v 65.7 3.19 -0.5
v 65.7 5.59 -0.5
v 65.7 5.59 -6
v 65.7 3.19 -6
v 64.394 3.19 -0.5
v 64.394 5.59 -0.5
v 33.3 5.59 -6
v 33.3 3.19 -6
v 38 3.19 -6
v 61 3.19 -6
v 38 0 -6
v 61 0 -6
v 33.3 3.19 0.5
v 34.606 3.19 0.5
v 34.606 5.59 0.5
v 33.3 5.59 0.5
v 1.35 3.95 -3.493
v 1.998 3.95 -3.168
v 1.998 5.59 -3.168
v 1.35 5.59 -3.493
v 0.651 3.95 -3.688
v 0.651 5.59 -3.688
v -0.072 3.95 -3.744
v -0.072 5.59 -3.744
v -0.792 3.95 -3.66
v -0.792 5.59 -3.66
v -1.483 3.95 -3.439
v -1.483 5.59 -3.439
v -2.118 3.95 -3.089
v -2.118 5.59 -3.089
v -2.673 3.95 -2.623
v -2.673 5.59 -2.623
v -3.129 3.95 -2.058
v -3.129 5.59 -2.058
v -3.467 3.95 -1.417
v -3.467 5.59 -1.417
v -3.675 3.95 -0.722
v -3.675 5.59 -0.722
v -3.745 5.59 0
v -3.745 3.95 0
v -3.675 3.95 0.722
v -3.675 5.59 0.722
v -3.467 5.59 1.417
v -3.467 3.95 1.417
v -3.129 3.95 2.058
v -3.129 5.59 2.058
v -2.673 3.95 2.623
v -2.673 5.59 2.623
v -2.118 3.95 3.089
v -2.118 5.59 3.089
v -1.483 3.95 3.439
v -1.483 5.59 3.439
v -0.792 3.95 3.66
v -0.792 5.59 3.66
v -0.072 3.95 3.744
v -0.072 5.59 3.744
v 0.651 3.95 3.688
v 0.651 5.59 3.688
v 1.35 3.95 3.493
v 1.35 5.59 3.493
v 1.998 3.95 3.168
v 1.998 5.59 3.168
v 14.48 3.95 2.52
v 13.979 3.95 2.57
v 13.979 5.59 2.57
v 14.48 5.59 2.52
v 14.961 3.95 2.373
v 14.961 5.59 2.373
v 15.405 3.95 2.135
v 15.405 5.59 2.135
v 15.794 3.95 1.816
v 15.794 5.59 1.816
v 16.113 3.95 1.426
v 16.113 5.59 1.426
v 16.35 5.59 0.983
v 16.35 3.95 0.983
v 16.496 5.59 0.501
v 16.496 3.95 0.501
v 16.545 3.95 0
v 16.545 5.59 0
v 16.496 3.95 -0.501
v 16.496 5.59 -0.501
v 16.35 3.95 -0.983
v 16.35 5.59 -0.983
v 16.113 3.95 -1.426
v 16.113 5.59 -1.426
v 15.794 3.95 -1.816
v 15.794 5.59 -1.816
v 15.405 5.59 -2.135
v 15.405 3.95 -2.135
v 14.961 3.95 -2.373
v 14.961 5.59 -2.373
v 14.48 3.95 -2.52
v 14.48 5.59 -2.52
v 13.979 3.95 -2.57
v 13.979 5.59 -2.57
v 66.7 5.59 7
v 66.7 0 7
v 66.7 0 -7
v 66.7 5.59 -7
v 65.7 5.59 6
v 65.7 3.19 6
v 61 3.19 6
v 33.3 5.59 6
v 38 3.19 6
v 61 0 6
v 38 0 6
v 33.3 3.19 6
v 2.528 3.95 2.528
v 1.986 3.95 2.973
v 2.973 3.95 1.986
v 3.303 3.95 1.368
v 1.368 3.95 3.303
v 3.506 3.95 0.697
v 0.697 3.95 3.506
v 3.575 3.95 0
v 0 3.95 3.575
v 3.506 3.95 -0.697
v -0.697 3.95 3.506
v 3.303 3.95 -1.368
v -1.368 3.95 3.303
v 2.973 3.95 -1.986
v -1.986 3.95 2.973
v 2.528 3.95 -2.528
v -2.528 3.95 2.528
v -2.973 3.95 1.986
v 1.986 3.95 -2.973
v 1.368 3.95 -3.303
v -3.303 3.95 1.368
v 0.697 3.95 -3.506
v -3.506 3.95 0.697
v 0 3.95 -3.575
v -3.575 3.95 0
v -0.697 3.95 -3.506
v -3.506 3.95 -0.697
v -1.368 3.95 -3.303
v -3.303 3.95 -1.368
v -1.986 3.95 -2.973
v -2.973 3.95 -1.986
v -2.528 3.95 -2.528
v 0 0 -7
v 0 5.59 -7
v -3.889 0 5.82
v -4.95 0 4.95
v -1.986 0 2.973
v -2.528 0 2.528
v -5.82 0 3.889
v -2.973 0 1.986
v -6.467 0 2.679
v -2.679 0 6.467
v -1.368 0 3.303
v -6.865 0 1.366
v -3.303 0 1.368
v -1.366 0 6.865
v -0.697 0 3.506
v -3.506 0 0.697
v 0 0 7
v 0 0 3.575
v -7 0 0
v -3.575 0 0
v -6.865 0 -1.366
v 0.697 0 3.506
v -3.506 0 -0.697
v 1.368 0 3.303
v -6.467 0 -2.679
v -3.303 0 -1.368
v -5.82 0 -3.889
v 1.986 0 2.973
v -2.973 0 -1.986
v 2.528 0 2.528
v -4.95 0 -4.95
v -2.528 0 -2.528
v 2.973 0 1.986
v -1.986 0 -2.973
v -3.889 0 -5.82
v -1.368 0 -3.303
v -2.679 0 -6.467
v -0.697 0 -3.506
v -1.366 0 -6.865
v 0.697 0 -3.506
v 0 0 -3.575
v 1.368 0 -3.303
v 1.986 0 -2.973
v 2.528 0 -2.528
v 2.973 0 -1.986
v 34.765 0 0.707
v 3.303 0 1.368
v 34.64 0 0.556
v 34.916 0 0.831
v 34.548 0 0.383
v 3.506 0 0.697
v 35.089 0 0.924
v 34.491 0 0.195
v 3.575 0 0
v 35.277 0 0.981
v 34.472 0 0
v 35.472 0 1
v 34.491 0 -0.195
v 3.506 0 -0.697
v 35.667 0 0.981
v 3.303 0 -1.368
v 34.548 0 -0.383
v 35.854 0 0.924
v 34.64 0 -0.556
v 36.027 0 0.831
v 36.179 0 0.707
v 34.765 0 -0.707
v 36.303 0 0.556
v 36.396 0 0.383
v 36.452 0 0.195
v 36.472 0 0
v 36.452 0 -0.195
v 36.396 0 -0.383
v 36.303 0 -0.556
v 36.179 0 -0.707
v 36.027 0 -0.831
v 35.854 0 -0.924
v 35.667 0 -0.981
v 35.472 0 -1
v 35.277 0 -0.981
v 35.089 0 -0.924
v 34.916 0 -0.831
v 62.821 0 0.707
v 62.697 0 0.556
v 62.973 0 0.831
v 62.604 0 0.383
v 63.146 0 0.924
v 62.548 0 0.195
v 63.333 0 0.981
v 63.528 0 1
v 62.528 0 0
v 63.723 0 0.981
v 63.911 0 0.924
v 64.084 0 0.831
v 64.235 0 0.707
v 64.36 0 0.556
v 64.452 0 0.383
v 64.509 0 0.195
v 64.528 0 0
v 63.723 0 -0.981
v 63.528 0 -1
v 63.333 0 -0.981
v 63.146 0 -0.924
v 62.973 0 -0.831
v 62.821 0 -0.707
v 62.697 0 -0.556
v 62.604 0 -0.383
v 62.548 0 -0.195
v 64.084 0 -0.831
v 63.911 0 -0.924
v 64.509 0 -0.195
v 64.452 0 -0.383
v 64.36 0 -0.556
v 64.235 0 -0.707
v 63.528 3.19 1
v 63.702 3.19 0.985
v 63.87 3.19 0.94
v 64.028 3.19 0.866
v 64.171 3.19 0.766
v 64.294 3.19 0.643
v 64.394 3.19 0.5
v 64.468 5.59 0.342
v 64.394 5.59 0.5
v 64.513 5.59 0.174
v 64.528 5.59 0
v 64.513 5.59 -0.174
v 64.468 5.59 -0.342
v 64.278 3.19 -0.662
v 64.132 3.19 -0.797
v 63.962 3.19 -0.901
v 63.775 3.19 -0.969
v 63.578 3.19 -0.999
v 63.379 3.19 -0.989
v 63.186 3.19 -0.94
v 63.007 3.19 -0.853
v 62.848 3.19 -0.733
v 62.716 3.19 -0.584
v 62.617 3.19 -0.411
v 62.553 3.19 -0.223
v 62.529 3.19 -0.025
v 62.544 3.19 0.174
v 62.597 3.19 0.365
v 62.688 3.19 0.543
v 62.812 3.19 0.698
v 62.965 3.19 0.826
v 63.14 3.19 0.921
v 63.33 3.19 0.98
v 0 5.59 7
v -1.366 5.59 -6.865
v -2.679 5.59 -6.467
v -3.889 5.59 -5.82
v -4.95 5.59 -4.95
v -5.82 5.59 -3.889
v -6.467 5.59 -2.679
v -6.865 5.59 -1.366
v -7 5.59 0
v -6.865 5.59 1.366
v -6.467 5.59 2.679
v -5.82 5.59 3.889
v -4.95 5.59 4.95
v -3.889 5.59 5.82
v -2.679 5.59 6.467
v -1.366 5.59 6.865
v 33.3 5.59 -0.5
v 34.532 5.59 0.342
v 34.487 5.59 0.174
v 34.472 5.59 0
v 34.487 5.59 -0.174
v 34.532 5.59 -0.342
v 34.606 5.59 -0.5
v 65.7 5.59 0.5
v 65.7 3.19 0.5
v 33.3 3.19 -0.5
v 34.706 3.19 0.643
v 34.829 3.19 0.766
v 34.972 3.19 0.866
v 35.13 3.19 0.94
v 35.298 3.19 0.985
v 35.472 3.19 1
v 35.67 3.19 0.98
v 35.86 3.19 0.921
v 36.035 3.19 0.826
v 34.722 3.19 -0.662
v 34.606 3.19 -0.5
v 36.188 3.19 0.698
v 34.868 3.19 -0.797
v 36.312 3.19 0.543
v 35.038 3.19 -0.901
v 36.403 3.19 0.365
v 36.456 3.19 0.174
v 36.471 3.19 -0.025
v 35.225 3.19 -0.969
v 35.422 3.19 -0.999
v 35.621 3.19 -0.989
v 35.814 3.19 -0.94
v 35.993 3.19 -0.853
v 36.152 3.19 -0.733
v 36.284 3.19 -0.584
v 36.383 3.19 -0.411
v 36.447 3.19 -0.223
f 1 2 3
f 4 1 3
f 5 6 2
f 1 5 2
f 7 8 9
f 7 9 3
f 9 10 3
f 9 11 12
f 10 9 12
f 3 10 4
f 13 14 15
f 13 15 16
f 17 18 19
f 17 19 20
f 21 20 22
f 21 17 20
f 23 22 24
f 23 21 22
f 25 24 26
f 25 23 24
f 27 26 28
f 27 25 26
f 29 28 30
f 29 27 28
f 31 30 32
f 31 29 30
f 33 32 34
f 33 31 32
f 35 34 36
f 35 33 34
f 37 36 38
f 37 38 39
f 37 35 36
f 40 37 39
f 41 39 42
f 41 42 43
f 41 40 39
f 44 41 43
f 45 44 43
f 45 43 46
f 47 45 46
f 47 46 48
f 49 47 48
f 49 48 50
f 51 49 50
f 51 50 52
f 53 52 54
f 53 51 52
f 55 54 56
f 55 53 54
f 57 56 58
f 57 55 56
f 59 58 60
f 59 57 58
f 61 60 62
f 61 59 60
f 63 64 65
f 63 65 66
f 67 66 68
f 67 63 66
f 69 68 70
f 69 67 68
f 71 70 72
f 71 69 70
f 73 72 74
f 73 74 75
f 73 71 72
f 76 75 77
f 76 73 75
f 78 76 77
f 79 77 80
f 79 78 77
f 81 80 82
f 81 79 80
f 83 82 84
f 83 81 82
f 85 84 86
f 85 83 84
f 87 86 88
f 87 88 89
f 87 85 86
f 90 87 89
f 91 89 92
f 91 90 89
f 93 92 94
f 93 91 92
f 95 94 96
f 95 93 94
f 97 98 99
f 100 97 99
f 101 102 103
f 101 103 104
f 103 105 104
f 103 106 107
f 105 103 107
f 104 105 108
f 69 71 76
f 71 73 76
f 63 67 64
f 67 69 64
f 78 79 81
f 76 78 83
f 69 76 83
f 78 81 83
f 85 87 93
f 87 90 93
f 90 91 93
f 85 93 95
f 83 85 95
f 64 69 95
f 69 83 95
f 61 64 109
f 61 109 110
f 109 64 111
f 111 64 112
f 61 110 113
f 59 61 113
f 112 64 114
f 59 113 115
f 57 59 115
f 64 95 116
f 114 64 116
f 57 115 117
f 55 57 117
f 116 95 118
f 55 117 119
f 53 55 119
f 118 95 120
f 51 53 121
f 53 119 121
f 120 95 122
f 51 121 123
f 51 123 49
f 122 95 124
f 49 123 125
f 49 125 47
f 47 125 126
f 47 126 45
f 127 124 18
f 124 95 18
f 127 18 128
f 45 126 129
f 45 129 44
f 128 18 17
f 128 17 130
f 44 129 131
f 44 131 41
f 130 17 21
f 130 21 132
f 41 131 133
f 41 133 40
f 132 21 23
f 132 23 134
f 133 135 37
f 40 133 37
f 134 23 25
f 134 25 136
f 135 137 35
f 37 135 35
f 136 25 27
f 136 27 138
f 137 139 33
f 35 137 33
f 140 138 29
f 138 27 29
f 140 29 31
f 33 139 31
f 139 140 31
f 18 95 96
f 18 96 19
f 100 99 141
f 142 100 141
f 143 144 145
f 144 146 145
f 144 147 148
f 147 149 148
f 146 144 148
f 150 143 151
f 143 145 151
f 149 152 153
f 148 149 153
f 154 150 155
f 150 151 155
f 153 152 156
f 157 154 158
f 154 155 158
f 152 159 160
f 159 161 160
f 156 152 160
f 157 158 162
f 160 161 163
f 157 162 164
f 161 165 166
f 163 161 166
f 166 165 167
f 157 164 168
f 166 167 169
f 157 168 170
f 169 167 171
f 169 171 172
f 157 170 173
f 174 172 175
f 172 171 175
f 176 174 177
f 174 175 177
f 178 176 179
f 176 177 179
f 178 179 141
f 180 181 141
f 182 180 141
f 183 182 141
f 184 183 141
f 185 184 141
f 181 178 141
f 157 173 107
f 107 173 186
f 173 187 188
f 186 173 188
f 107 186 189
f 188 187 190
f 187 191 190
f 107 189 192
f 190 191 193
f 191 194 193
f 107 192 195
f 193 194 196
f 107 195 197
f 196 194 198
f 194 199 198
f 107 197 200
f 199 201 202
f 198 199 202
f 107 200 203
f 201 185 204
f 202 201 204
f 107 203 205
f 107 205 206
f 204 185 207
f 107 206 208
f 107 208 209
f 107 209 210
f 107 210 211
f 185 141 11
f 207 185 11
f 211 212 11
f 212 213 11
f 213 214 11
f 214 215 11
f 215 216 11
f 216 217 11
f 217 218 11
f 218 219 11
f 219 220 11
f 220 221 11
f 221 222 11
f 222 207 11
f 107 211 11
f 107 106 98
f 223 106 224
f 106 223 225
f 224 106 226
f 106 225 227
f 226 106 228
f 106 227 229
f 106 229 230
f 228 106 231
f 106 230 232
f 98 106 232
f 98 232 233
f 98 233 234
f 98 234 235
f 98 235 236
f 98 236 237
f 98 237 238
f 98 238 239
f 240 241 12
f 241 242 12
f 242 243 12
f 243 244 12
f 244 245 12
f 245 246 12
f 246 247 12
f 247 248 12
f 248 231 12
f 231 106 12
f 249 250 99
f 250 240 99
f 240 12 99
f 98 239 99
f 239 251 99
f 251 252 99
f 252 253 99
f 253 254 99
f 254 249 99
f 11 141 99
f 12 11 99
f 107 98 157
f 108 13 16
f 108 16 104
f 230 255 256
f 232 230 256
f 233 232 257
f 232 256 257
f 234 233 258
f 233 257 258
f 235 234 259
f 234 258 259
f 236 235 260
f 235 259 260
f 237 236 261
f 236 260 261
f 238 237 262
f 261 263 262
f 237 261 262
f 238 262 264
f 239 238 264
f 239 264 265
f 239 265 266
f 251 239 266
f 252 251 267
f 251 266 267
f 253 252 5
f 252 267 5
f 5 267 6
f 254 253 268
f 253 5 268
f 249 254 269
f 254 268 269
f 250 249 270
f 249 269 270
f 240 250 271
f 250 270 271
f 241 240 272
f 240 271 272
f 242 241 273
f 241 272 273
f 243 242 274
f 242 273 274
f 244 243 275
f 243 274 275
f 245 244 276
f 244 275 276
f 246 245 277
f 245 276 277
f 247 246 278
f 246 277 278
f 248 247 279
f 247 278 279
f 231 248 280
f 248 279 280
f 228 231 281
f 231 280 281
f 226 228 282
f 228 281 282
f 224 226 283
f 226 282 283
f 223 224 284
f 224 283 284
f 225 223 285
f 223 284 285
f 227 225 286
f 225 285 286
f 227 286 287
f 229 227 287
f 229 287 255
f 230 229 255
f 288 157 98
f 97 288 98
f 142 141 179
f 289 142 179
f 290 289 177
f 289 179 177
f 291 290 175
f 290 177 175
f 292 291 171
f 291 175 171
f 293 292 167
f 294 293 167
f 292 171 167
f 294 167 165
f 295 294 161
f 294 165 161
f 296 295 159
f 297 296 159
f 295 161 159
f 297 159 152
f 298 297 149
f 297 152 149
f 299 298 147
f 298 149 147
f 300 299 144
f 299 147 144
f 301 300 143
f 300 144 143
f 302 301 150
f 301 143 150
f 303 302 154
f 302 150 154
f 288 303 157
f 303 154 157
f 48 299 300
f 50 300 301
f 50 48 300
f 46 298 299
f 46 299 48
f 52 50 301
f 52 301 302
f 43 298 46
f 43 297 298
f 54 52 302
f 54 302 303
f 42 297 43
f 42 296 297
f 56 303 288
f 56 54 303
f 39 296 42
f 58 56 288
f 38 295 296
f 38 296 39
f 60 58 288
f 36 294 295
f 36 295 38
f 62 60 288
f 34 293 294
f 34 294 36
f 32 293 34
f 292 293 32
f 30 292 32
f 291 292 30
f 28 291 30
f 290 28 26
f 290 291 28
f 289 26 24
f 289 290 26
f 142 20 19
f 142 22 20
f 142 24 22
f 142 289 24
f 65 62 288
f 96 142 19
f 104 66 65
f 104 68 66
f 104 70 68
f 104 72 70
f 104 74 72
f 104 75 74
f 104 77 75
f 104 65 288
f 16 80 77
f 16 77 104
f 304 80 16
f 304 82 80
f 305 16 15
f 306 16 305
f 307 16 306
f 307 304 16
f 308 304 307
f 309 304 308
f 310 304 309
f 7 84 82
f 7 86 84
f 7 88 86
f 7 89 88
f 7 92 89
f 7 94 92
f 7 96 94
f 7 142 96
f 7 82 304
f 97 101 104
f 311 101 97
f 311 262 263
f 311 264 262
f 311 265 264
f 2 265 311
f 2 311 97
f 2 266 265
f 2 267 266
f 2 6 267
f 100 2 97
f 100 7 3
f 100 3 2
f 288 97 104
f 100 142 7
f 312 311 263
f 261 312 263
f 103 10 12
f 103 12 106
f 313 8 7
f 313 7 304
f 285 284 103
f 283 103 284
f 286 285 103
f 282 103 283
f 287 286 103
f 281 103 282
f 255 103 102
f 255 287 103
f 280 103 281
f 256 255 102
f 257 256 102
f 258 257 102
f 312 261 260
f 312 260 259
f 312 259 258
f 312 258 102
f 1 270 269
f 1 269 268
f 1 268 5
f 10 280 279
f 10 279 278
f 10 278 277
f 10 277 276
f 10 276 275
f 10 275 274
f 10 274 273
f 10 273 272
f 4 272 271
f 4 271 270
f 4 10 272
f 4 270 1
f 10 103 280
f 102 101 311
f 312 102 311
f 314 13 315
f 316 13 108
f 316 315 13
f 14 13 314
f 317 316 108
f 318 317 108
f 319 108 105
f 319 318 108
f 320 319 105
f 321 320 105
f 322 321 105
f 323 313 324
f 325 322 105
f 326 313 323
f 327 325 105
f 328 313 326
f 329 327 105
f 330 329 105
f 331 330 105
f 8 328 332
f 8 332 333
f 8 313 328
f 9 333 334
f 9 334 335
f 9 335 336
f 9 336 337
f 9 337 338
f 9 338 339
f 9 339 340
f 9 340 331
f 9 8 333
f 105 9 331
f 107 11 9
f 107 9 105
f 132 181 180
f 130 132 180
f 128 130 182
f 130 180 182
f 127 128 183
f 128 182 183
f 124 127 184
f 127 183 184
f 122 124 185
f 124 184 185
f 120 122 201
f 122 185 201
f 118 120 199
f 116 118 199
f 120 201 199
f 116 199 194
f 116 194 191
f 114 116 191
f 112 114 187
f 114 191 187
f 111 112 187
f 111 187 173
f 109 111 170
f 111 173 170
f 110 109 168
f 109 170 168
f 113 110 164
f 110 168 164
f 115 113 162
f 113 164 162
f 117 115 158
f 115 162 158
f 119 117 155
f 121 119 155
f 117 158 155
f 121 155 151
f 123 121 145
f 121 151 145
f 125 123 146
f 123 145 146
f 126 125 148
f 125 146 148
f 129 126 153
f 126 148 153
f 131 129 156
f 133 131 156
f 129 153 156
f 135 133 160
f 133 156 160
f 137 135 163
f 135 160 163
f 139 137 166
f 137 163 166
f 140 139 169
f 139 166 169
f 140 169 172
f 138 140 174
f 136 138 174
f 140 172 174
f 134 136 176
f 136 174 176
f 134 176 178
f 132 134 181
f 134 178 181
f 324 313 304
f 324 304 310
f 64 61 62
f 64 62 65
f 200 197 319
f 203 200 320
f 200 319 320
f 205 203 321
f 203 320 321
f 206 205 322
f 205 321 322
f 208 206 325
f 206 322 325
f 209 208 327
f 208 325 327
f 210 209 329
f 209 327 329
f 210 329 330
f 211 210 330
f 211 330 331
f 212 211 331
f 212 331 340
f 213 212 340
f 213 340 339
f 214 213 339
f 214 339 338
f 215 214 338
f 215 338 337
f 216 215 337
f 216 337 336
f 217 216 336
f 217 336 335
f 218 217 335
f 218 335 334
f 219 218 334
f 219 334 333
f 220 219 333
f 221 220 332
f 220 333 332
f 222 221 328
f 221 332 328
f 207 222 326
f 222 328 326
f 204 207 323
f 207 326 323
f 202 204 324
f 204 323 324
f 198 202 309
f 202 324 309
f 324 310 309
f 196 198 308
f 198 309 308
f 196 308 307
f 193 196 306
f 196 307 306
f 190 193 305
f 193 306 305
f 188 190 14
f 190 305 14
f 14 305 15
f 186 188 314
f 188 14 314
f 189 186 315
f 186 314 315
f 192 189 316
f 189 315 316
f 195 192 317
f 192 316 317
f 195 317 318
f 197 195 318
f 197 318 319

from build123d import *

# Parameters (mm, degrees)
BOSS_EXTRUDE1_DEPTH = 3.95
SKETCH2_R           = 3.575
CUT_EXTRUDE1_DEPTH  = 3.95
BOSS_EXTRUDE2_DEPTH = 1.64
SKETCH4_R           = 3.25
CUT_EXTRUDE2_DEPTH  = 63.643819328
CAVITY1_OUTLINE_R   = 3.25
CAVITY1_DEPTH       = 5.59
CAVITY1_START       = 3.19
CAVITY1_2_DEPTH     = 2.4
CUT_EXTRUDE4_DEPTH  = 63.643819328
BOSS_EXTRUDE3_START = -5.59
BOSS_EXTRUDE3_DEPTH = 5.59
BOSS_EXTRUDE4_DEPTH = 5.59
BOSS_EXTRUDE5_DEPTH = 5.59
CUT_EXTRUDE5_DEPTH  = 2.4
SKETCH7_R           = 1
CUT_EXTRUDE6_DEPTH  = 5.59


# Read off the part's stored shape, not the designer's step: Cavity1
with BuildPart() as part:
    # Sketch1 → Boss-Extrude1 (new body)
    with BuildSketch(Plane(origin=(0, 0, 0), x_dir=(1, 0, 0), z_dir=(0, 1, 0))):
        with BuildLine():
            Line((0, 7), (55, 7))
            ThreePointArc((55, 7), (62, 0), (55, -7))
            Line((55, -7), (0, -7))
            ThreePointArc((0, -7), (-7, 0), (0, 7))
        make_face()
    extrude(amount=BOSS_EXTRUDE1_DEPTH)

    # Sketch2 → Cut-Extrude1 (cut)
    with BuildSketch(Plane.XZ):
        with Locations(Location((0, 0, 0), (0, 0, 270))):
            Circle(SKETCH2_R)
    extrude(amount=-CUT_EXTRUDE1_DEPTH, mode=Mode.SUBTRACT)

    # Sketch3 → Boss-Extrude2 (add)
    with BuildSketch(Plane(origin=(0, 3.95, 0), x_dir=(1, 0, 0), z_dir=(0, 1, 0))):
        with BuildLine():
            Line((0, -7), (55, -7))
            ThreePointArc((55, -7), (62, 0), (55, 7))
            Line((55, 7), (0, 7))
            ThreePointArc((0, 7), (-7, 0), (0, -7))
        make_face()
        with BuildLine():
            Line((13.979308982, 2.569996388), (1.997926282, 3.167540934))
            ThreePointArc((1.997926282, 3.167540934), (-3.745, 0), (1.997926282, -3.167540934))
            Line((1.997926282, -3.167540934), (13.979308982, -2.569996388))
            ThreePointArc((13.979308982, -2.569996388), (16.545, 0), (13.979308982, 2.569996388))
        make_face(mode=Mode.SUBTRACT)
    extrude(amount=BOSS_EXTRUDE2_DEPTH)

    # Sketch4 → Cut-Extrude2 (cut, through all)
    with BuildSketch(Plane(origin=(0, 5.59, 0), x_dir=(1, 0, 0), z_dir=(0, 1, 0))):
        with Locations(Location((55, 0, 0), (0, 0, 270))):
            Circle(SKETCH4_R)
    extrude(amount=-CUT_EXTRUDE2_DEPTH, mode=Mode.SUBTRACT)

    # Cavity1 outline → Cavity1 (cut)
    with BuildSketch(Plane(origin=(0, 0, 0), x_dir=(1, 0, 0), z_dir=(0, 1, 0))):
        with BuildLine():
            Line((58.605551275, 6), (38, 6))
            Line((38, 6), (38, -6))
            Line((38, -6), (58.605551275, -6))
            ThreePointArc((58.605551275, -6), (59.949747468, -4.949747468), (61, -3.605551275))
            Line((61, -3.605551275), (61, 3.605551275))
            ThreePointArc((61, 3.605551275), (59.949747468, 4.949747468), (58.605551275, 6))
        make_face()
        with Locations((55, 0)):
            Circle(CAVITY1_OUTLINE_R, mode=Mode.SUBTRACT)
    extrude(amount=CAVITY1_DEPTH, mode=Mode.SUBTRACT)

    # Cavity1 2 outline → Cavity1 2 (cut)
    with BuildSketch(Plane(origin=(0, 0, 0), x_dir=(1, 0, 0), z_dir=(0, 1, 0)).offset(CAVITY1_START)):
        with BuildLine():
            Line((33.3, 0.5), (34.605619966, 0.5))
            ThreePointArc((34.605619966, 0.5), (36.47164537, 0), (34.605619966, -0.5))
            Line((34.605619966, -0.5), (33.3, -0.5))
            Line((33.3, -0.5), (33.3, -6))
            Line((33.3, -6), (38, -6))
            Line((38, -6), (38, 6))
            Line((38, 6), (33.3, 6))
            Line((33.3, 6), (33.3, 0.5))
        make_face()
        with BuildLine():
            ThreePointArc((61, -3.605551275), (62, 0), (61, 3.605551275))
            Line((61, 3.605551275), (61, -3.605551275))
        make_face()
    extrude(amount=CAVITY1_2_DEPTH, mode=Mode.SUBTRACT)

    # Sketch5 → Cut-Extrude4 (cut, through all)
    with BuildSketch(Plane.XZ):
        with BuildLine():
            Line((61, 3.605551275), (61, -3.605551275))
            ThreePointArc((61, -3.605551275), (62, 0), (61, 3.605551275))
        make_face()
    extrude(amount=-CUT_EXTRUDE4_DEPTH, mode=Mode.SUBTRACT)

    # Sketch6 → Boss-Extrude3 (add)
    with BuildSketch(Plane(origin=(0, 5.59, 0), x_dir=(1, 0, 0), z_dir=(0, 1, 0)).offset(BOSS_EXTRUDE3_START)):
        with BuildLine():
            Line((61, -6), (58.605551275, -6))
            ThreePointArc((58.605551275, -6), (56.870828693, -6.745368782), (55, -7))
            Line((55, -7), (66.7, -7))
            Line((66.7, -7), (66.7, 7))
            Line((66.7, 7), (55, 7))
            ThreePointArc((55, 7), (56.870828693, 6.745368782), (58.605551275, 6))
            Line((58.605551275, 6), (61, 6))
            Line((61, 6), (65.7, 6))
            Line((65.7, 6), (65.7, 0.5))
            Line((65.7, 0.5), (65.7, -0.5))
            Line((65.7, -0.5), (65.7, -6))
            Line((65.7, -6), (61, -6))
        make_face()
        with BuildLine():
            Line((58.605551275, -6), (33.3, -6))
            Line((33.3, -6), (33.3, -7))
            Line((33.3, -7), (55, -7))
            ThreePointArc((55, -7), (56.870828693, -6.745368782), (58.605551275, -6))
        make_face()
        with BuildLine():
            Line((33.3, 7), (33.3, 6))
            Line((33.3, 6), (58.605551275, 6))
            ThreePointArc((58.605551275, 6), (56.870828693, 6.745368782), (55, 7))
            Line((55, 7), (33.3, 7))
        make_face()
    extrude(amount=BOSS_EXTRUDE3_DEPTH)

    # Sketch6<3> → Boss-Extrude4 (add)
    with BuildSketch(Plane(origin=(0, 5.59, 0), x_dir=(1, 0, 0), z_dir=(0, 1, 0))):
        with BuildLine():
            Line((64.394380034, -0.5), (65.7, -0.5))
            Line((65.7, -0.5), (65.7, 0.5))
            Line((65.7, 0.5), (64.394380034, 0.5))
            ThreePointArc((64.394380034, 0.5), (62.52835463, 0), (64.394380034, -0.5))
        make_face()
    extrude(amount=-BOSS_EXTRUDE4_DEPTH)

    # Sketch6<5> → Boss-Extrude5 (add)
    with BuildSketch(Plane(origin=(0, 5.59, 0), x_dir=(1, 0, 0), z_dir=(0, 1, 0))):
        with BuildLine():
            Line((61, 6), (61, -6))
            Line((61, -6), (65.7, -6))
            Line((65.7, -6), (65.7, -0.5))
            Line((65.7, -0.5), (64.394380034, -0.5))
            ThreePointArc((64.394380034, -0.5), (62.52835463, 0), (64.394380034, 0.5))
            Line((64.394380034, 0.5), (65.7, 0.5))
            Line((65.7, 0.5), (65.7, 6))
            Line((65.7, 6), (61, 6))
        make_face()
    extrude(amount=-BOSS_EXTRUDE5_DEPTH)

    # Sketch6<6> → Cut-Extrude5 (cut)
    with BuildSketch(Plane(origin=(0, 5.59, 0), x_dir=(1, 0, 0), z_dir=(0, 1, 0))):
        with BuildLine():
            Line((61, 6), (61, -6))
            Line((61, -6), (65.7, -6))
            Line((65.7, -6), (65.7, -0.5))
            Line((65.7, -0.5), (64.394380034, -0.5))
            ThreePointArc((64.394380034, -0.5), (62.52835463, 0), (64.394380034, 0.5))
            Line((64.394380034, 0.5), (65.7, 0.5))
            Line((65.7, 0.5), (65.7, 6))
            Line((65.7, 6), (61, 6))
        make_face()
    extrude(amount=-CUT_EXTRUDE5_DEPTH, mode=Mode.SUBTRACT)

    # Sketch7 → Cut-Extrude6 (cut)
    with BuildSketch(Plane(origin=(0, 5.59, 0), x_dir=(1, 0, 0), z_dir=(0, 1, 0))):
        with Locations(Location((63.52835463, 0, 0), (0, 0, 270))):
            Circle(SKETCH7_R)
        with Locations(Location((35.47164537, 0, 0), (0, 0, 270))):
            Circle(SKETCH7_R)
    extrude(amount=-CUT_EXTRUDE6_DEPTH, mode=Mode.SUBTRACT)


solid = part.part
